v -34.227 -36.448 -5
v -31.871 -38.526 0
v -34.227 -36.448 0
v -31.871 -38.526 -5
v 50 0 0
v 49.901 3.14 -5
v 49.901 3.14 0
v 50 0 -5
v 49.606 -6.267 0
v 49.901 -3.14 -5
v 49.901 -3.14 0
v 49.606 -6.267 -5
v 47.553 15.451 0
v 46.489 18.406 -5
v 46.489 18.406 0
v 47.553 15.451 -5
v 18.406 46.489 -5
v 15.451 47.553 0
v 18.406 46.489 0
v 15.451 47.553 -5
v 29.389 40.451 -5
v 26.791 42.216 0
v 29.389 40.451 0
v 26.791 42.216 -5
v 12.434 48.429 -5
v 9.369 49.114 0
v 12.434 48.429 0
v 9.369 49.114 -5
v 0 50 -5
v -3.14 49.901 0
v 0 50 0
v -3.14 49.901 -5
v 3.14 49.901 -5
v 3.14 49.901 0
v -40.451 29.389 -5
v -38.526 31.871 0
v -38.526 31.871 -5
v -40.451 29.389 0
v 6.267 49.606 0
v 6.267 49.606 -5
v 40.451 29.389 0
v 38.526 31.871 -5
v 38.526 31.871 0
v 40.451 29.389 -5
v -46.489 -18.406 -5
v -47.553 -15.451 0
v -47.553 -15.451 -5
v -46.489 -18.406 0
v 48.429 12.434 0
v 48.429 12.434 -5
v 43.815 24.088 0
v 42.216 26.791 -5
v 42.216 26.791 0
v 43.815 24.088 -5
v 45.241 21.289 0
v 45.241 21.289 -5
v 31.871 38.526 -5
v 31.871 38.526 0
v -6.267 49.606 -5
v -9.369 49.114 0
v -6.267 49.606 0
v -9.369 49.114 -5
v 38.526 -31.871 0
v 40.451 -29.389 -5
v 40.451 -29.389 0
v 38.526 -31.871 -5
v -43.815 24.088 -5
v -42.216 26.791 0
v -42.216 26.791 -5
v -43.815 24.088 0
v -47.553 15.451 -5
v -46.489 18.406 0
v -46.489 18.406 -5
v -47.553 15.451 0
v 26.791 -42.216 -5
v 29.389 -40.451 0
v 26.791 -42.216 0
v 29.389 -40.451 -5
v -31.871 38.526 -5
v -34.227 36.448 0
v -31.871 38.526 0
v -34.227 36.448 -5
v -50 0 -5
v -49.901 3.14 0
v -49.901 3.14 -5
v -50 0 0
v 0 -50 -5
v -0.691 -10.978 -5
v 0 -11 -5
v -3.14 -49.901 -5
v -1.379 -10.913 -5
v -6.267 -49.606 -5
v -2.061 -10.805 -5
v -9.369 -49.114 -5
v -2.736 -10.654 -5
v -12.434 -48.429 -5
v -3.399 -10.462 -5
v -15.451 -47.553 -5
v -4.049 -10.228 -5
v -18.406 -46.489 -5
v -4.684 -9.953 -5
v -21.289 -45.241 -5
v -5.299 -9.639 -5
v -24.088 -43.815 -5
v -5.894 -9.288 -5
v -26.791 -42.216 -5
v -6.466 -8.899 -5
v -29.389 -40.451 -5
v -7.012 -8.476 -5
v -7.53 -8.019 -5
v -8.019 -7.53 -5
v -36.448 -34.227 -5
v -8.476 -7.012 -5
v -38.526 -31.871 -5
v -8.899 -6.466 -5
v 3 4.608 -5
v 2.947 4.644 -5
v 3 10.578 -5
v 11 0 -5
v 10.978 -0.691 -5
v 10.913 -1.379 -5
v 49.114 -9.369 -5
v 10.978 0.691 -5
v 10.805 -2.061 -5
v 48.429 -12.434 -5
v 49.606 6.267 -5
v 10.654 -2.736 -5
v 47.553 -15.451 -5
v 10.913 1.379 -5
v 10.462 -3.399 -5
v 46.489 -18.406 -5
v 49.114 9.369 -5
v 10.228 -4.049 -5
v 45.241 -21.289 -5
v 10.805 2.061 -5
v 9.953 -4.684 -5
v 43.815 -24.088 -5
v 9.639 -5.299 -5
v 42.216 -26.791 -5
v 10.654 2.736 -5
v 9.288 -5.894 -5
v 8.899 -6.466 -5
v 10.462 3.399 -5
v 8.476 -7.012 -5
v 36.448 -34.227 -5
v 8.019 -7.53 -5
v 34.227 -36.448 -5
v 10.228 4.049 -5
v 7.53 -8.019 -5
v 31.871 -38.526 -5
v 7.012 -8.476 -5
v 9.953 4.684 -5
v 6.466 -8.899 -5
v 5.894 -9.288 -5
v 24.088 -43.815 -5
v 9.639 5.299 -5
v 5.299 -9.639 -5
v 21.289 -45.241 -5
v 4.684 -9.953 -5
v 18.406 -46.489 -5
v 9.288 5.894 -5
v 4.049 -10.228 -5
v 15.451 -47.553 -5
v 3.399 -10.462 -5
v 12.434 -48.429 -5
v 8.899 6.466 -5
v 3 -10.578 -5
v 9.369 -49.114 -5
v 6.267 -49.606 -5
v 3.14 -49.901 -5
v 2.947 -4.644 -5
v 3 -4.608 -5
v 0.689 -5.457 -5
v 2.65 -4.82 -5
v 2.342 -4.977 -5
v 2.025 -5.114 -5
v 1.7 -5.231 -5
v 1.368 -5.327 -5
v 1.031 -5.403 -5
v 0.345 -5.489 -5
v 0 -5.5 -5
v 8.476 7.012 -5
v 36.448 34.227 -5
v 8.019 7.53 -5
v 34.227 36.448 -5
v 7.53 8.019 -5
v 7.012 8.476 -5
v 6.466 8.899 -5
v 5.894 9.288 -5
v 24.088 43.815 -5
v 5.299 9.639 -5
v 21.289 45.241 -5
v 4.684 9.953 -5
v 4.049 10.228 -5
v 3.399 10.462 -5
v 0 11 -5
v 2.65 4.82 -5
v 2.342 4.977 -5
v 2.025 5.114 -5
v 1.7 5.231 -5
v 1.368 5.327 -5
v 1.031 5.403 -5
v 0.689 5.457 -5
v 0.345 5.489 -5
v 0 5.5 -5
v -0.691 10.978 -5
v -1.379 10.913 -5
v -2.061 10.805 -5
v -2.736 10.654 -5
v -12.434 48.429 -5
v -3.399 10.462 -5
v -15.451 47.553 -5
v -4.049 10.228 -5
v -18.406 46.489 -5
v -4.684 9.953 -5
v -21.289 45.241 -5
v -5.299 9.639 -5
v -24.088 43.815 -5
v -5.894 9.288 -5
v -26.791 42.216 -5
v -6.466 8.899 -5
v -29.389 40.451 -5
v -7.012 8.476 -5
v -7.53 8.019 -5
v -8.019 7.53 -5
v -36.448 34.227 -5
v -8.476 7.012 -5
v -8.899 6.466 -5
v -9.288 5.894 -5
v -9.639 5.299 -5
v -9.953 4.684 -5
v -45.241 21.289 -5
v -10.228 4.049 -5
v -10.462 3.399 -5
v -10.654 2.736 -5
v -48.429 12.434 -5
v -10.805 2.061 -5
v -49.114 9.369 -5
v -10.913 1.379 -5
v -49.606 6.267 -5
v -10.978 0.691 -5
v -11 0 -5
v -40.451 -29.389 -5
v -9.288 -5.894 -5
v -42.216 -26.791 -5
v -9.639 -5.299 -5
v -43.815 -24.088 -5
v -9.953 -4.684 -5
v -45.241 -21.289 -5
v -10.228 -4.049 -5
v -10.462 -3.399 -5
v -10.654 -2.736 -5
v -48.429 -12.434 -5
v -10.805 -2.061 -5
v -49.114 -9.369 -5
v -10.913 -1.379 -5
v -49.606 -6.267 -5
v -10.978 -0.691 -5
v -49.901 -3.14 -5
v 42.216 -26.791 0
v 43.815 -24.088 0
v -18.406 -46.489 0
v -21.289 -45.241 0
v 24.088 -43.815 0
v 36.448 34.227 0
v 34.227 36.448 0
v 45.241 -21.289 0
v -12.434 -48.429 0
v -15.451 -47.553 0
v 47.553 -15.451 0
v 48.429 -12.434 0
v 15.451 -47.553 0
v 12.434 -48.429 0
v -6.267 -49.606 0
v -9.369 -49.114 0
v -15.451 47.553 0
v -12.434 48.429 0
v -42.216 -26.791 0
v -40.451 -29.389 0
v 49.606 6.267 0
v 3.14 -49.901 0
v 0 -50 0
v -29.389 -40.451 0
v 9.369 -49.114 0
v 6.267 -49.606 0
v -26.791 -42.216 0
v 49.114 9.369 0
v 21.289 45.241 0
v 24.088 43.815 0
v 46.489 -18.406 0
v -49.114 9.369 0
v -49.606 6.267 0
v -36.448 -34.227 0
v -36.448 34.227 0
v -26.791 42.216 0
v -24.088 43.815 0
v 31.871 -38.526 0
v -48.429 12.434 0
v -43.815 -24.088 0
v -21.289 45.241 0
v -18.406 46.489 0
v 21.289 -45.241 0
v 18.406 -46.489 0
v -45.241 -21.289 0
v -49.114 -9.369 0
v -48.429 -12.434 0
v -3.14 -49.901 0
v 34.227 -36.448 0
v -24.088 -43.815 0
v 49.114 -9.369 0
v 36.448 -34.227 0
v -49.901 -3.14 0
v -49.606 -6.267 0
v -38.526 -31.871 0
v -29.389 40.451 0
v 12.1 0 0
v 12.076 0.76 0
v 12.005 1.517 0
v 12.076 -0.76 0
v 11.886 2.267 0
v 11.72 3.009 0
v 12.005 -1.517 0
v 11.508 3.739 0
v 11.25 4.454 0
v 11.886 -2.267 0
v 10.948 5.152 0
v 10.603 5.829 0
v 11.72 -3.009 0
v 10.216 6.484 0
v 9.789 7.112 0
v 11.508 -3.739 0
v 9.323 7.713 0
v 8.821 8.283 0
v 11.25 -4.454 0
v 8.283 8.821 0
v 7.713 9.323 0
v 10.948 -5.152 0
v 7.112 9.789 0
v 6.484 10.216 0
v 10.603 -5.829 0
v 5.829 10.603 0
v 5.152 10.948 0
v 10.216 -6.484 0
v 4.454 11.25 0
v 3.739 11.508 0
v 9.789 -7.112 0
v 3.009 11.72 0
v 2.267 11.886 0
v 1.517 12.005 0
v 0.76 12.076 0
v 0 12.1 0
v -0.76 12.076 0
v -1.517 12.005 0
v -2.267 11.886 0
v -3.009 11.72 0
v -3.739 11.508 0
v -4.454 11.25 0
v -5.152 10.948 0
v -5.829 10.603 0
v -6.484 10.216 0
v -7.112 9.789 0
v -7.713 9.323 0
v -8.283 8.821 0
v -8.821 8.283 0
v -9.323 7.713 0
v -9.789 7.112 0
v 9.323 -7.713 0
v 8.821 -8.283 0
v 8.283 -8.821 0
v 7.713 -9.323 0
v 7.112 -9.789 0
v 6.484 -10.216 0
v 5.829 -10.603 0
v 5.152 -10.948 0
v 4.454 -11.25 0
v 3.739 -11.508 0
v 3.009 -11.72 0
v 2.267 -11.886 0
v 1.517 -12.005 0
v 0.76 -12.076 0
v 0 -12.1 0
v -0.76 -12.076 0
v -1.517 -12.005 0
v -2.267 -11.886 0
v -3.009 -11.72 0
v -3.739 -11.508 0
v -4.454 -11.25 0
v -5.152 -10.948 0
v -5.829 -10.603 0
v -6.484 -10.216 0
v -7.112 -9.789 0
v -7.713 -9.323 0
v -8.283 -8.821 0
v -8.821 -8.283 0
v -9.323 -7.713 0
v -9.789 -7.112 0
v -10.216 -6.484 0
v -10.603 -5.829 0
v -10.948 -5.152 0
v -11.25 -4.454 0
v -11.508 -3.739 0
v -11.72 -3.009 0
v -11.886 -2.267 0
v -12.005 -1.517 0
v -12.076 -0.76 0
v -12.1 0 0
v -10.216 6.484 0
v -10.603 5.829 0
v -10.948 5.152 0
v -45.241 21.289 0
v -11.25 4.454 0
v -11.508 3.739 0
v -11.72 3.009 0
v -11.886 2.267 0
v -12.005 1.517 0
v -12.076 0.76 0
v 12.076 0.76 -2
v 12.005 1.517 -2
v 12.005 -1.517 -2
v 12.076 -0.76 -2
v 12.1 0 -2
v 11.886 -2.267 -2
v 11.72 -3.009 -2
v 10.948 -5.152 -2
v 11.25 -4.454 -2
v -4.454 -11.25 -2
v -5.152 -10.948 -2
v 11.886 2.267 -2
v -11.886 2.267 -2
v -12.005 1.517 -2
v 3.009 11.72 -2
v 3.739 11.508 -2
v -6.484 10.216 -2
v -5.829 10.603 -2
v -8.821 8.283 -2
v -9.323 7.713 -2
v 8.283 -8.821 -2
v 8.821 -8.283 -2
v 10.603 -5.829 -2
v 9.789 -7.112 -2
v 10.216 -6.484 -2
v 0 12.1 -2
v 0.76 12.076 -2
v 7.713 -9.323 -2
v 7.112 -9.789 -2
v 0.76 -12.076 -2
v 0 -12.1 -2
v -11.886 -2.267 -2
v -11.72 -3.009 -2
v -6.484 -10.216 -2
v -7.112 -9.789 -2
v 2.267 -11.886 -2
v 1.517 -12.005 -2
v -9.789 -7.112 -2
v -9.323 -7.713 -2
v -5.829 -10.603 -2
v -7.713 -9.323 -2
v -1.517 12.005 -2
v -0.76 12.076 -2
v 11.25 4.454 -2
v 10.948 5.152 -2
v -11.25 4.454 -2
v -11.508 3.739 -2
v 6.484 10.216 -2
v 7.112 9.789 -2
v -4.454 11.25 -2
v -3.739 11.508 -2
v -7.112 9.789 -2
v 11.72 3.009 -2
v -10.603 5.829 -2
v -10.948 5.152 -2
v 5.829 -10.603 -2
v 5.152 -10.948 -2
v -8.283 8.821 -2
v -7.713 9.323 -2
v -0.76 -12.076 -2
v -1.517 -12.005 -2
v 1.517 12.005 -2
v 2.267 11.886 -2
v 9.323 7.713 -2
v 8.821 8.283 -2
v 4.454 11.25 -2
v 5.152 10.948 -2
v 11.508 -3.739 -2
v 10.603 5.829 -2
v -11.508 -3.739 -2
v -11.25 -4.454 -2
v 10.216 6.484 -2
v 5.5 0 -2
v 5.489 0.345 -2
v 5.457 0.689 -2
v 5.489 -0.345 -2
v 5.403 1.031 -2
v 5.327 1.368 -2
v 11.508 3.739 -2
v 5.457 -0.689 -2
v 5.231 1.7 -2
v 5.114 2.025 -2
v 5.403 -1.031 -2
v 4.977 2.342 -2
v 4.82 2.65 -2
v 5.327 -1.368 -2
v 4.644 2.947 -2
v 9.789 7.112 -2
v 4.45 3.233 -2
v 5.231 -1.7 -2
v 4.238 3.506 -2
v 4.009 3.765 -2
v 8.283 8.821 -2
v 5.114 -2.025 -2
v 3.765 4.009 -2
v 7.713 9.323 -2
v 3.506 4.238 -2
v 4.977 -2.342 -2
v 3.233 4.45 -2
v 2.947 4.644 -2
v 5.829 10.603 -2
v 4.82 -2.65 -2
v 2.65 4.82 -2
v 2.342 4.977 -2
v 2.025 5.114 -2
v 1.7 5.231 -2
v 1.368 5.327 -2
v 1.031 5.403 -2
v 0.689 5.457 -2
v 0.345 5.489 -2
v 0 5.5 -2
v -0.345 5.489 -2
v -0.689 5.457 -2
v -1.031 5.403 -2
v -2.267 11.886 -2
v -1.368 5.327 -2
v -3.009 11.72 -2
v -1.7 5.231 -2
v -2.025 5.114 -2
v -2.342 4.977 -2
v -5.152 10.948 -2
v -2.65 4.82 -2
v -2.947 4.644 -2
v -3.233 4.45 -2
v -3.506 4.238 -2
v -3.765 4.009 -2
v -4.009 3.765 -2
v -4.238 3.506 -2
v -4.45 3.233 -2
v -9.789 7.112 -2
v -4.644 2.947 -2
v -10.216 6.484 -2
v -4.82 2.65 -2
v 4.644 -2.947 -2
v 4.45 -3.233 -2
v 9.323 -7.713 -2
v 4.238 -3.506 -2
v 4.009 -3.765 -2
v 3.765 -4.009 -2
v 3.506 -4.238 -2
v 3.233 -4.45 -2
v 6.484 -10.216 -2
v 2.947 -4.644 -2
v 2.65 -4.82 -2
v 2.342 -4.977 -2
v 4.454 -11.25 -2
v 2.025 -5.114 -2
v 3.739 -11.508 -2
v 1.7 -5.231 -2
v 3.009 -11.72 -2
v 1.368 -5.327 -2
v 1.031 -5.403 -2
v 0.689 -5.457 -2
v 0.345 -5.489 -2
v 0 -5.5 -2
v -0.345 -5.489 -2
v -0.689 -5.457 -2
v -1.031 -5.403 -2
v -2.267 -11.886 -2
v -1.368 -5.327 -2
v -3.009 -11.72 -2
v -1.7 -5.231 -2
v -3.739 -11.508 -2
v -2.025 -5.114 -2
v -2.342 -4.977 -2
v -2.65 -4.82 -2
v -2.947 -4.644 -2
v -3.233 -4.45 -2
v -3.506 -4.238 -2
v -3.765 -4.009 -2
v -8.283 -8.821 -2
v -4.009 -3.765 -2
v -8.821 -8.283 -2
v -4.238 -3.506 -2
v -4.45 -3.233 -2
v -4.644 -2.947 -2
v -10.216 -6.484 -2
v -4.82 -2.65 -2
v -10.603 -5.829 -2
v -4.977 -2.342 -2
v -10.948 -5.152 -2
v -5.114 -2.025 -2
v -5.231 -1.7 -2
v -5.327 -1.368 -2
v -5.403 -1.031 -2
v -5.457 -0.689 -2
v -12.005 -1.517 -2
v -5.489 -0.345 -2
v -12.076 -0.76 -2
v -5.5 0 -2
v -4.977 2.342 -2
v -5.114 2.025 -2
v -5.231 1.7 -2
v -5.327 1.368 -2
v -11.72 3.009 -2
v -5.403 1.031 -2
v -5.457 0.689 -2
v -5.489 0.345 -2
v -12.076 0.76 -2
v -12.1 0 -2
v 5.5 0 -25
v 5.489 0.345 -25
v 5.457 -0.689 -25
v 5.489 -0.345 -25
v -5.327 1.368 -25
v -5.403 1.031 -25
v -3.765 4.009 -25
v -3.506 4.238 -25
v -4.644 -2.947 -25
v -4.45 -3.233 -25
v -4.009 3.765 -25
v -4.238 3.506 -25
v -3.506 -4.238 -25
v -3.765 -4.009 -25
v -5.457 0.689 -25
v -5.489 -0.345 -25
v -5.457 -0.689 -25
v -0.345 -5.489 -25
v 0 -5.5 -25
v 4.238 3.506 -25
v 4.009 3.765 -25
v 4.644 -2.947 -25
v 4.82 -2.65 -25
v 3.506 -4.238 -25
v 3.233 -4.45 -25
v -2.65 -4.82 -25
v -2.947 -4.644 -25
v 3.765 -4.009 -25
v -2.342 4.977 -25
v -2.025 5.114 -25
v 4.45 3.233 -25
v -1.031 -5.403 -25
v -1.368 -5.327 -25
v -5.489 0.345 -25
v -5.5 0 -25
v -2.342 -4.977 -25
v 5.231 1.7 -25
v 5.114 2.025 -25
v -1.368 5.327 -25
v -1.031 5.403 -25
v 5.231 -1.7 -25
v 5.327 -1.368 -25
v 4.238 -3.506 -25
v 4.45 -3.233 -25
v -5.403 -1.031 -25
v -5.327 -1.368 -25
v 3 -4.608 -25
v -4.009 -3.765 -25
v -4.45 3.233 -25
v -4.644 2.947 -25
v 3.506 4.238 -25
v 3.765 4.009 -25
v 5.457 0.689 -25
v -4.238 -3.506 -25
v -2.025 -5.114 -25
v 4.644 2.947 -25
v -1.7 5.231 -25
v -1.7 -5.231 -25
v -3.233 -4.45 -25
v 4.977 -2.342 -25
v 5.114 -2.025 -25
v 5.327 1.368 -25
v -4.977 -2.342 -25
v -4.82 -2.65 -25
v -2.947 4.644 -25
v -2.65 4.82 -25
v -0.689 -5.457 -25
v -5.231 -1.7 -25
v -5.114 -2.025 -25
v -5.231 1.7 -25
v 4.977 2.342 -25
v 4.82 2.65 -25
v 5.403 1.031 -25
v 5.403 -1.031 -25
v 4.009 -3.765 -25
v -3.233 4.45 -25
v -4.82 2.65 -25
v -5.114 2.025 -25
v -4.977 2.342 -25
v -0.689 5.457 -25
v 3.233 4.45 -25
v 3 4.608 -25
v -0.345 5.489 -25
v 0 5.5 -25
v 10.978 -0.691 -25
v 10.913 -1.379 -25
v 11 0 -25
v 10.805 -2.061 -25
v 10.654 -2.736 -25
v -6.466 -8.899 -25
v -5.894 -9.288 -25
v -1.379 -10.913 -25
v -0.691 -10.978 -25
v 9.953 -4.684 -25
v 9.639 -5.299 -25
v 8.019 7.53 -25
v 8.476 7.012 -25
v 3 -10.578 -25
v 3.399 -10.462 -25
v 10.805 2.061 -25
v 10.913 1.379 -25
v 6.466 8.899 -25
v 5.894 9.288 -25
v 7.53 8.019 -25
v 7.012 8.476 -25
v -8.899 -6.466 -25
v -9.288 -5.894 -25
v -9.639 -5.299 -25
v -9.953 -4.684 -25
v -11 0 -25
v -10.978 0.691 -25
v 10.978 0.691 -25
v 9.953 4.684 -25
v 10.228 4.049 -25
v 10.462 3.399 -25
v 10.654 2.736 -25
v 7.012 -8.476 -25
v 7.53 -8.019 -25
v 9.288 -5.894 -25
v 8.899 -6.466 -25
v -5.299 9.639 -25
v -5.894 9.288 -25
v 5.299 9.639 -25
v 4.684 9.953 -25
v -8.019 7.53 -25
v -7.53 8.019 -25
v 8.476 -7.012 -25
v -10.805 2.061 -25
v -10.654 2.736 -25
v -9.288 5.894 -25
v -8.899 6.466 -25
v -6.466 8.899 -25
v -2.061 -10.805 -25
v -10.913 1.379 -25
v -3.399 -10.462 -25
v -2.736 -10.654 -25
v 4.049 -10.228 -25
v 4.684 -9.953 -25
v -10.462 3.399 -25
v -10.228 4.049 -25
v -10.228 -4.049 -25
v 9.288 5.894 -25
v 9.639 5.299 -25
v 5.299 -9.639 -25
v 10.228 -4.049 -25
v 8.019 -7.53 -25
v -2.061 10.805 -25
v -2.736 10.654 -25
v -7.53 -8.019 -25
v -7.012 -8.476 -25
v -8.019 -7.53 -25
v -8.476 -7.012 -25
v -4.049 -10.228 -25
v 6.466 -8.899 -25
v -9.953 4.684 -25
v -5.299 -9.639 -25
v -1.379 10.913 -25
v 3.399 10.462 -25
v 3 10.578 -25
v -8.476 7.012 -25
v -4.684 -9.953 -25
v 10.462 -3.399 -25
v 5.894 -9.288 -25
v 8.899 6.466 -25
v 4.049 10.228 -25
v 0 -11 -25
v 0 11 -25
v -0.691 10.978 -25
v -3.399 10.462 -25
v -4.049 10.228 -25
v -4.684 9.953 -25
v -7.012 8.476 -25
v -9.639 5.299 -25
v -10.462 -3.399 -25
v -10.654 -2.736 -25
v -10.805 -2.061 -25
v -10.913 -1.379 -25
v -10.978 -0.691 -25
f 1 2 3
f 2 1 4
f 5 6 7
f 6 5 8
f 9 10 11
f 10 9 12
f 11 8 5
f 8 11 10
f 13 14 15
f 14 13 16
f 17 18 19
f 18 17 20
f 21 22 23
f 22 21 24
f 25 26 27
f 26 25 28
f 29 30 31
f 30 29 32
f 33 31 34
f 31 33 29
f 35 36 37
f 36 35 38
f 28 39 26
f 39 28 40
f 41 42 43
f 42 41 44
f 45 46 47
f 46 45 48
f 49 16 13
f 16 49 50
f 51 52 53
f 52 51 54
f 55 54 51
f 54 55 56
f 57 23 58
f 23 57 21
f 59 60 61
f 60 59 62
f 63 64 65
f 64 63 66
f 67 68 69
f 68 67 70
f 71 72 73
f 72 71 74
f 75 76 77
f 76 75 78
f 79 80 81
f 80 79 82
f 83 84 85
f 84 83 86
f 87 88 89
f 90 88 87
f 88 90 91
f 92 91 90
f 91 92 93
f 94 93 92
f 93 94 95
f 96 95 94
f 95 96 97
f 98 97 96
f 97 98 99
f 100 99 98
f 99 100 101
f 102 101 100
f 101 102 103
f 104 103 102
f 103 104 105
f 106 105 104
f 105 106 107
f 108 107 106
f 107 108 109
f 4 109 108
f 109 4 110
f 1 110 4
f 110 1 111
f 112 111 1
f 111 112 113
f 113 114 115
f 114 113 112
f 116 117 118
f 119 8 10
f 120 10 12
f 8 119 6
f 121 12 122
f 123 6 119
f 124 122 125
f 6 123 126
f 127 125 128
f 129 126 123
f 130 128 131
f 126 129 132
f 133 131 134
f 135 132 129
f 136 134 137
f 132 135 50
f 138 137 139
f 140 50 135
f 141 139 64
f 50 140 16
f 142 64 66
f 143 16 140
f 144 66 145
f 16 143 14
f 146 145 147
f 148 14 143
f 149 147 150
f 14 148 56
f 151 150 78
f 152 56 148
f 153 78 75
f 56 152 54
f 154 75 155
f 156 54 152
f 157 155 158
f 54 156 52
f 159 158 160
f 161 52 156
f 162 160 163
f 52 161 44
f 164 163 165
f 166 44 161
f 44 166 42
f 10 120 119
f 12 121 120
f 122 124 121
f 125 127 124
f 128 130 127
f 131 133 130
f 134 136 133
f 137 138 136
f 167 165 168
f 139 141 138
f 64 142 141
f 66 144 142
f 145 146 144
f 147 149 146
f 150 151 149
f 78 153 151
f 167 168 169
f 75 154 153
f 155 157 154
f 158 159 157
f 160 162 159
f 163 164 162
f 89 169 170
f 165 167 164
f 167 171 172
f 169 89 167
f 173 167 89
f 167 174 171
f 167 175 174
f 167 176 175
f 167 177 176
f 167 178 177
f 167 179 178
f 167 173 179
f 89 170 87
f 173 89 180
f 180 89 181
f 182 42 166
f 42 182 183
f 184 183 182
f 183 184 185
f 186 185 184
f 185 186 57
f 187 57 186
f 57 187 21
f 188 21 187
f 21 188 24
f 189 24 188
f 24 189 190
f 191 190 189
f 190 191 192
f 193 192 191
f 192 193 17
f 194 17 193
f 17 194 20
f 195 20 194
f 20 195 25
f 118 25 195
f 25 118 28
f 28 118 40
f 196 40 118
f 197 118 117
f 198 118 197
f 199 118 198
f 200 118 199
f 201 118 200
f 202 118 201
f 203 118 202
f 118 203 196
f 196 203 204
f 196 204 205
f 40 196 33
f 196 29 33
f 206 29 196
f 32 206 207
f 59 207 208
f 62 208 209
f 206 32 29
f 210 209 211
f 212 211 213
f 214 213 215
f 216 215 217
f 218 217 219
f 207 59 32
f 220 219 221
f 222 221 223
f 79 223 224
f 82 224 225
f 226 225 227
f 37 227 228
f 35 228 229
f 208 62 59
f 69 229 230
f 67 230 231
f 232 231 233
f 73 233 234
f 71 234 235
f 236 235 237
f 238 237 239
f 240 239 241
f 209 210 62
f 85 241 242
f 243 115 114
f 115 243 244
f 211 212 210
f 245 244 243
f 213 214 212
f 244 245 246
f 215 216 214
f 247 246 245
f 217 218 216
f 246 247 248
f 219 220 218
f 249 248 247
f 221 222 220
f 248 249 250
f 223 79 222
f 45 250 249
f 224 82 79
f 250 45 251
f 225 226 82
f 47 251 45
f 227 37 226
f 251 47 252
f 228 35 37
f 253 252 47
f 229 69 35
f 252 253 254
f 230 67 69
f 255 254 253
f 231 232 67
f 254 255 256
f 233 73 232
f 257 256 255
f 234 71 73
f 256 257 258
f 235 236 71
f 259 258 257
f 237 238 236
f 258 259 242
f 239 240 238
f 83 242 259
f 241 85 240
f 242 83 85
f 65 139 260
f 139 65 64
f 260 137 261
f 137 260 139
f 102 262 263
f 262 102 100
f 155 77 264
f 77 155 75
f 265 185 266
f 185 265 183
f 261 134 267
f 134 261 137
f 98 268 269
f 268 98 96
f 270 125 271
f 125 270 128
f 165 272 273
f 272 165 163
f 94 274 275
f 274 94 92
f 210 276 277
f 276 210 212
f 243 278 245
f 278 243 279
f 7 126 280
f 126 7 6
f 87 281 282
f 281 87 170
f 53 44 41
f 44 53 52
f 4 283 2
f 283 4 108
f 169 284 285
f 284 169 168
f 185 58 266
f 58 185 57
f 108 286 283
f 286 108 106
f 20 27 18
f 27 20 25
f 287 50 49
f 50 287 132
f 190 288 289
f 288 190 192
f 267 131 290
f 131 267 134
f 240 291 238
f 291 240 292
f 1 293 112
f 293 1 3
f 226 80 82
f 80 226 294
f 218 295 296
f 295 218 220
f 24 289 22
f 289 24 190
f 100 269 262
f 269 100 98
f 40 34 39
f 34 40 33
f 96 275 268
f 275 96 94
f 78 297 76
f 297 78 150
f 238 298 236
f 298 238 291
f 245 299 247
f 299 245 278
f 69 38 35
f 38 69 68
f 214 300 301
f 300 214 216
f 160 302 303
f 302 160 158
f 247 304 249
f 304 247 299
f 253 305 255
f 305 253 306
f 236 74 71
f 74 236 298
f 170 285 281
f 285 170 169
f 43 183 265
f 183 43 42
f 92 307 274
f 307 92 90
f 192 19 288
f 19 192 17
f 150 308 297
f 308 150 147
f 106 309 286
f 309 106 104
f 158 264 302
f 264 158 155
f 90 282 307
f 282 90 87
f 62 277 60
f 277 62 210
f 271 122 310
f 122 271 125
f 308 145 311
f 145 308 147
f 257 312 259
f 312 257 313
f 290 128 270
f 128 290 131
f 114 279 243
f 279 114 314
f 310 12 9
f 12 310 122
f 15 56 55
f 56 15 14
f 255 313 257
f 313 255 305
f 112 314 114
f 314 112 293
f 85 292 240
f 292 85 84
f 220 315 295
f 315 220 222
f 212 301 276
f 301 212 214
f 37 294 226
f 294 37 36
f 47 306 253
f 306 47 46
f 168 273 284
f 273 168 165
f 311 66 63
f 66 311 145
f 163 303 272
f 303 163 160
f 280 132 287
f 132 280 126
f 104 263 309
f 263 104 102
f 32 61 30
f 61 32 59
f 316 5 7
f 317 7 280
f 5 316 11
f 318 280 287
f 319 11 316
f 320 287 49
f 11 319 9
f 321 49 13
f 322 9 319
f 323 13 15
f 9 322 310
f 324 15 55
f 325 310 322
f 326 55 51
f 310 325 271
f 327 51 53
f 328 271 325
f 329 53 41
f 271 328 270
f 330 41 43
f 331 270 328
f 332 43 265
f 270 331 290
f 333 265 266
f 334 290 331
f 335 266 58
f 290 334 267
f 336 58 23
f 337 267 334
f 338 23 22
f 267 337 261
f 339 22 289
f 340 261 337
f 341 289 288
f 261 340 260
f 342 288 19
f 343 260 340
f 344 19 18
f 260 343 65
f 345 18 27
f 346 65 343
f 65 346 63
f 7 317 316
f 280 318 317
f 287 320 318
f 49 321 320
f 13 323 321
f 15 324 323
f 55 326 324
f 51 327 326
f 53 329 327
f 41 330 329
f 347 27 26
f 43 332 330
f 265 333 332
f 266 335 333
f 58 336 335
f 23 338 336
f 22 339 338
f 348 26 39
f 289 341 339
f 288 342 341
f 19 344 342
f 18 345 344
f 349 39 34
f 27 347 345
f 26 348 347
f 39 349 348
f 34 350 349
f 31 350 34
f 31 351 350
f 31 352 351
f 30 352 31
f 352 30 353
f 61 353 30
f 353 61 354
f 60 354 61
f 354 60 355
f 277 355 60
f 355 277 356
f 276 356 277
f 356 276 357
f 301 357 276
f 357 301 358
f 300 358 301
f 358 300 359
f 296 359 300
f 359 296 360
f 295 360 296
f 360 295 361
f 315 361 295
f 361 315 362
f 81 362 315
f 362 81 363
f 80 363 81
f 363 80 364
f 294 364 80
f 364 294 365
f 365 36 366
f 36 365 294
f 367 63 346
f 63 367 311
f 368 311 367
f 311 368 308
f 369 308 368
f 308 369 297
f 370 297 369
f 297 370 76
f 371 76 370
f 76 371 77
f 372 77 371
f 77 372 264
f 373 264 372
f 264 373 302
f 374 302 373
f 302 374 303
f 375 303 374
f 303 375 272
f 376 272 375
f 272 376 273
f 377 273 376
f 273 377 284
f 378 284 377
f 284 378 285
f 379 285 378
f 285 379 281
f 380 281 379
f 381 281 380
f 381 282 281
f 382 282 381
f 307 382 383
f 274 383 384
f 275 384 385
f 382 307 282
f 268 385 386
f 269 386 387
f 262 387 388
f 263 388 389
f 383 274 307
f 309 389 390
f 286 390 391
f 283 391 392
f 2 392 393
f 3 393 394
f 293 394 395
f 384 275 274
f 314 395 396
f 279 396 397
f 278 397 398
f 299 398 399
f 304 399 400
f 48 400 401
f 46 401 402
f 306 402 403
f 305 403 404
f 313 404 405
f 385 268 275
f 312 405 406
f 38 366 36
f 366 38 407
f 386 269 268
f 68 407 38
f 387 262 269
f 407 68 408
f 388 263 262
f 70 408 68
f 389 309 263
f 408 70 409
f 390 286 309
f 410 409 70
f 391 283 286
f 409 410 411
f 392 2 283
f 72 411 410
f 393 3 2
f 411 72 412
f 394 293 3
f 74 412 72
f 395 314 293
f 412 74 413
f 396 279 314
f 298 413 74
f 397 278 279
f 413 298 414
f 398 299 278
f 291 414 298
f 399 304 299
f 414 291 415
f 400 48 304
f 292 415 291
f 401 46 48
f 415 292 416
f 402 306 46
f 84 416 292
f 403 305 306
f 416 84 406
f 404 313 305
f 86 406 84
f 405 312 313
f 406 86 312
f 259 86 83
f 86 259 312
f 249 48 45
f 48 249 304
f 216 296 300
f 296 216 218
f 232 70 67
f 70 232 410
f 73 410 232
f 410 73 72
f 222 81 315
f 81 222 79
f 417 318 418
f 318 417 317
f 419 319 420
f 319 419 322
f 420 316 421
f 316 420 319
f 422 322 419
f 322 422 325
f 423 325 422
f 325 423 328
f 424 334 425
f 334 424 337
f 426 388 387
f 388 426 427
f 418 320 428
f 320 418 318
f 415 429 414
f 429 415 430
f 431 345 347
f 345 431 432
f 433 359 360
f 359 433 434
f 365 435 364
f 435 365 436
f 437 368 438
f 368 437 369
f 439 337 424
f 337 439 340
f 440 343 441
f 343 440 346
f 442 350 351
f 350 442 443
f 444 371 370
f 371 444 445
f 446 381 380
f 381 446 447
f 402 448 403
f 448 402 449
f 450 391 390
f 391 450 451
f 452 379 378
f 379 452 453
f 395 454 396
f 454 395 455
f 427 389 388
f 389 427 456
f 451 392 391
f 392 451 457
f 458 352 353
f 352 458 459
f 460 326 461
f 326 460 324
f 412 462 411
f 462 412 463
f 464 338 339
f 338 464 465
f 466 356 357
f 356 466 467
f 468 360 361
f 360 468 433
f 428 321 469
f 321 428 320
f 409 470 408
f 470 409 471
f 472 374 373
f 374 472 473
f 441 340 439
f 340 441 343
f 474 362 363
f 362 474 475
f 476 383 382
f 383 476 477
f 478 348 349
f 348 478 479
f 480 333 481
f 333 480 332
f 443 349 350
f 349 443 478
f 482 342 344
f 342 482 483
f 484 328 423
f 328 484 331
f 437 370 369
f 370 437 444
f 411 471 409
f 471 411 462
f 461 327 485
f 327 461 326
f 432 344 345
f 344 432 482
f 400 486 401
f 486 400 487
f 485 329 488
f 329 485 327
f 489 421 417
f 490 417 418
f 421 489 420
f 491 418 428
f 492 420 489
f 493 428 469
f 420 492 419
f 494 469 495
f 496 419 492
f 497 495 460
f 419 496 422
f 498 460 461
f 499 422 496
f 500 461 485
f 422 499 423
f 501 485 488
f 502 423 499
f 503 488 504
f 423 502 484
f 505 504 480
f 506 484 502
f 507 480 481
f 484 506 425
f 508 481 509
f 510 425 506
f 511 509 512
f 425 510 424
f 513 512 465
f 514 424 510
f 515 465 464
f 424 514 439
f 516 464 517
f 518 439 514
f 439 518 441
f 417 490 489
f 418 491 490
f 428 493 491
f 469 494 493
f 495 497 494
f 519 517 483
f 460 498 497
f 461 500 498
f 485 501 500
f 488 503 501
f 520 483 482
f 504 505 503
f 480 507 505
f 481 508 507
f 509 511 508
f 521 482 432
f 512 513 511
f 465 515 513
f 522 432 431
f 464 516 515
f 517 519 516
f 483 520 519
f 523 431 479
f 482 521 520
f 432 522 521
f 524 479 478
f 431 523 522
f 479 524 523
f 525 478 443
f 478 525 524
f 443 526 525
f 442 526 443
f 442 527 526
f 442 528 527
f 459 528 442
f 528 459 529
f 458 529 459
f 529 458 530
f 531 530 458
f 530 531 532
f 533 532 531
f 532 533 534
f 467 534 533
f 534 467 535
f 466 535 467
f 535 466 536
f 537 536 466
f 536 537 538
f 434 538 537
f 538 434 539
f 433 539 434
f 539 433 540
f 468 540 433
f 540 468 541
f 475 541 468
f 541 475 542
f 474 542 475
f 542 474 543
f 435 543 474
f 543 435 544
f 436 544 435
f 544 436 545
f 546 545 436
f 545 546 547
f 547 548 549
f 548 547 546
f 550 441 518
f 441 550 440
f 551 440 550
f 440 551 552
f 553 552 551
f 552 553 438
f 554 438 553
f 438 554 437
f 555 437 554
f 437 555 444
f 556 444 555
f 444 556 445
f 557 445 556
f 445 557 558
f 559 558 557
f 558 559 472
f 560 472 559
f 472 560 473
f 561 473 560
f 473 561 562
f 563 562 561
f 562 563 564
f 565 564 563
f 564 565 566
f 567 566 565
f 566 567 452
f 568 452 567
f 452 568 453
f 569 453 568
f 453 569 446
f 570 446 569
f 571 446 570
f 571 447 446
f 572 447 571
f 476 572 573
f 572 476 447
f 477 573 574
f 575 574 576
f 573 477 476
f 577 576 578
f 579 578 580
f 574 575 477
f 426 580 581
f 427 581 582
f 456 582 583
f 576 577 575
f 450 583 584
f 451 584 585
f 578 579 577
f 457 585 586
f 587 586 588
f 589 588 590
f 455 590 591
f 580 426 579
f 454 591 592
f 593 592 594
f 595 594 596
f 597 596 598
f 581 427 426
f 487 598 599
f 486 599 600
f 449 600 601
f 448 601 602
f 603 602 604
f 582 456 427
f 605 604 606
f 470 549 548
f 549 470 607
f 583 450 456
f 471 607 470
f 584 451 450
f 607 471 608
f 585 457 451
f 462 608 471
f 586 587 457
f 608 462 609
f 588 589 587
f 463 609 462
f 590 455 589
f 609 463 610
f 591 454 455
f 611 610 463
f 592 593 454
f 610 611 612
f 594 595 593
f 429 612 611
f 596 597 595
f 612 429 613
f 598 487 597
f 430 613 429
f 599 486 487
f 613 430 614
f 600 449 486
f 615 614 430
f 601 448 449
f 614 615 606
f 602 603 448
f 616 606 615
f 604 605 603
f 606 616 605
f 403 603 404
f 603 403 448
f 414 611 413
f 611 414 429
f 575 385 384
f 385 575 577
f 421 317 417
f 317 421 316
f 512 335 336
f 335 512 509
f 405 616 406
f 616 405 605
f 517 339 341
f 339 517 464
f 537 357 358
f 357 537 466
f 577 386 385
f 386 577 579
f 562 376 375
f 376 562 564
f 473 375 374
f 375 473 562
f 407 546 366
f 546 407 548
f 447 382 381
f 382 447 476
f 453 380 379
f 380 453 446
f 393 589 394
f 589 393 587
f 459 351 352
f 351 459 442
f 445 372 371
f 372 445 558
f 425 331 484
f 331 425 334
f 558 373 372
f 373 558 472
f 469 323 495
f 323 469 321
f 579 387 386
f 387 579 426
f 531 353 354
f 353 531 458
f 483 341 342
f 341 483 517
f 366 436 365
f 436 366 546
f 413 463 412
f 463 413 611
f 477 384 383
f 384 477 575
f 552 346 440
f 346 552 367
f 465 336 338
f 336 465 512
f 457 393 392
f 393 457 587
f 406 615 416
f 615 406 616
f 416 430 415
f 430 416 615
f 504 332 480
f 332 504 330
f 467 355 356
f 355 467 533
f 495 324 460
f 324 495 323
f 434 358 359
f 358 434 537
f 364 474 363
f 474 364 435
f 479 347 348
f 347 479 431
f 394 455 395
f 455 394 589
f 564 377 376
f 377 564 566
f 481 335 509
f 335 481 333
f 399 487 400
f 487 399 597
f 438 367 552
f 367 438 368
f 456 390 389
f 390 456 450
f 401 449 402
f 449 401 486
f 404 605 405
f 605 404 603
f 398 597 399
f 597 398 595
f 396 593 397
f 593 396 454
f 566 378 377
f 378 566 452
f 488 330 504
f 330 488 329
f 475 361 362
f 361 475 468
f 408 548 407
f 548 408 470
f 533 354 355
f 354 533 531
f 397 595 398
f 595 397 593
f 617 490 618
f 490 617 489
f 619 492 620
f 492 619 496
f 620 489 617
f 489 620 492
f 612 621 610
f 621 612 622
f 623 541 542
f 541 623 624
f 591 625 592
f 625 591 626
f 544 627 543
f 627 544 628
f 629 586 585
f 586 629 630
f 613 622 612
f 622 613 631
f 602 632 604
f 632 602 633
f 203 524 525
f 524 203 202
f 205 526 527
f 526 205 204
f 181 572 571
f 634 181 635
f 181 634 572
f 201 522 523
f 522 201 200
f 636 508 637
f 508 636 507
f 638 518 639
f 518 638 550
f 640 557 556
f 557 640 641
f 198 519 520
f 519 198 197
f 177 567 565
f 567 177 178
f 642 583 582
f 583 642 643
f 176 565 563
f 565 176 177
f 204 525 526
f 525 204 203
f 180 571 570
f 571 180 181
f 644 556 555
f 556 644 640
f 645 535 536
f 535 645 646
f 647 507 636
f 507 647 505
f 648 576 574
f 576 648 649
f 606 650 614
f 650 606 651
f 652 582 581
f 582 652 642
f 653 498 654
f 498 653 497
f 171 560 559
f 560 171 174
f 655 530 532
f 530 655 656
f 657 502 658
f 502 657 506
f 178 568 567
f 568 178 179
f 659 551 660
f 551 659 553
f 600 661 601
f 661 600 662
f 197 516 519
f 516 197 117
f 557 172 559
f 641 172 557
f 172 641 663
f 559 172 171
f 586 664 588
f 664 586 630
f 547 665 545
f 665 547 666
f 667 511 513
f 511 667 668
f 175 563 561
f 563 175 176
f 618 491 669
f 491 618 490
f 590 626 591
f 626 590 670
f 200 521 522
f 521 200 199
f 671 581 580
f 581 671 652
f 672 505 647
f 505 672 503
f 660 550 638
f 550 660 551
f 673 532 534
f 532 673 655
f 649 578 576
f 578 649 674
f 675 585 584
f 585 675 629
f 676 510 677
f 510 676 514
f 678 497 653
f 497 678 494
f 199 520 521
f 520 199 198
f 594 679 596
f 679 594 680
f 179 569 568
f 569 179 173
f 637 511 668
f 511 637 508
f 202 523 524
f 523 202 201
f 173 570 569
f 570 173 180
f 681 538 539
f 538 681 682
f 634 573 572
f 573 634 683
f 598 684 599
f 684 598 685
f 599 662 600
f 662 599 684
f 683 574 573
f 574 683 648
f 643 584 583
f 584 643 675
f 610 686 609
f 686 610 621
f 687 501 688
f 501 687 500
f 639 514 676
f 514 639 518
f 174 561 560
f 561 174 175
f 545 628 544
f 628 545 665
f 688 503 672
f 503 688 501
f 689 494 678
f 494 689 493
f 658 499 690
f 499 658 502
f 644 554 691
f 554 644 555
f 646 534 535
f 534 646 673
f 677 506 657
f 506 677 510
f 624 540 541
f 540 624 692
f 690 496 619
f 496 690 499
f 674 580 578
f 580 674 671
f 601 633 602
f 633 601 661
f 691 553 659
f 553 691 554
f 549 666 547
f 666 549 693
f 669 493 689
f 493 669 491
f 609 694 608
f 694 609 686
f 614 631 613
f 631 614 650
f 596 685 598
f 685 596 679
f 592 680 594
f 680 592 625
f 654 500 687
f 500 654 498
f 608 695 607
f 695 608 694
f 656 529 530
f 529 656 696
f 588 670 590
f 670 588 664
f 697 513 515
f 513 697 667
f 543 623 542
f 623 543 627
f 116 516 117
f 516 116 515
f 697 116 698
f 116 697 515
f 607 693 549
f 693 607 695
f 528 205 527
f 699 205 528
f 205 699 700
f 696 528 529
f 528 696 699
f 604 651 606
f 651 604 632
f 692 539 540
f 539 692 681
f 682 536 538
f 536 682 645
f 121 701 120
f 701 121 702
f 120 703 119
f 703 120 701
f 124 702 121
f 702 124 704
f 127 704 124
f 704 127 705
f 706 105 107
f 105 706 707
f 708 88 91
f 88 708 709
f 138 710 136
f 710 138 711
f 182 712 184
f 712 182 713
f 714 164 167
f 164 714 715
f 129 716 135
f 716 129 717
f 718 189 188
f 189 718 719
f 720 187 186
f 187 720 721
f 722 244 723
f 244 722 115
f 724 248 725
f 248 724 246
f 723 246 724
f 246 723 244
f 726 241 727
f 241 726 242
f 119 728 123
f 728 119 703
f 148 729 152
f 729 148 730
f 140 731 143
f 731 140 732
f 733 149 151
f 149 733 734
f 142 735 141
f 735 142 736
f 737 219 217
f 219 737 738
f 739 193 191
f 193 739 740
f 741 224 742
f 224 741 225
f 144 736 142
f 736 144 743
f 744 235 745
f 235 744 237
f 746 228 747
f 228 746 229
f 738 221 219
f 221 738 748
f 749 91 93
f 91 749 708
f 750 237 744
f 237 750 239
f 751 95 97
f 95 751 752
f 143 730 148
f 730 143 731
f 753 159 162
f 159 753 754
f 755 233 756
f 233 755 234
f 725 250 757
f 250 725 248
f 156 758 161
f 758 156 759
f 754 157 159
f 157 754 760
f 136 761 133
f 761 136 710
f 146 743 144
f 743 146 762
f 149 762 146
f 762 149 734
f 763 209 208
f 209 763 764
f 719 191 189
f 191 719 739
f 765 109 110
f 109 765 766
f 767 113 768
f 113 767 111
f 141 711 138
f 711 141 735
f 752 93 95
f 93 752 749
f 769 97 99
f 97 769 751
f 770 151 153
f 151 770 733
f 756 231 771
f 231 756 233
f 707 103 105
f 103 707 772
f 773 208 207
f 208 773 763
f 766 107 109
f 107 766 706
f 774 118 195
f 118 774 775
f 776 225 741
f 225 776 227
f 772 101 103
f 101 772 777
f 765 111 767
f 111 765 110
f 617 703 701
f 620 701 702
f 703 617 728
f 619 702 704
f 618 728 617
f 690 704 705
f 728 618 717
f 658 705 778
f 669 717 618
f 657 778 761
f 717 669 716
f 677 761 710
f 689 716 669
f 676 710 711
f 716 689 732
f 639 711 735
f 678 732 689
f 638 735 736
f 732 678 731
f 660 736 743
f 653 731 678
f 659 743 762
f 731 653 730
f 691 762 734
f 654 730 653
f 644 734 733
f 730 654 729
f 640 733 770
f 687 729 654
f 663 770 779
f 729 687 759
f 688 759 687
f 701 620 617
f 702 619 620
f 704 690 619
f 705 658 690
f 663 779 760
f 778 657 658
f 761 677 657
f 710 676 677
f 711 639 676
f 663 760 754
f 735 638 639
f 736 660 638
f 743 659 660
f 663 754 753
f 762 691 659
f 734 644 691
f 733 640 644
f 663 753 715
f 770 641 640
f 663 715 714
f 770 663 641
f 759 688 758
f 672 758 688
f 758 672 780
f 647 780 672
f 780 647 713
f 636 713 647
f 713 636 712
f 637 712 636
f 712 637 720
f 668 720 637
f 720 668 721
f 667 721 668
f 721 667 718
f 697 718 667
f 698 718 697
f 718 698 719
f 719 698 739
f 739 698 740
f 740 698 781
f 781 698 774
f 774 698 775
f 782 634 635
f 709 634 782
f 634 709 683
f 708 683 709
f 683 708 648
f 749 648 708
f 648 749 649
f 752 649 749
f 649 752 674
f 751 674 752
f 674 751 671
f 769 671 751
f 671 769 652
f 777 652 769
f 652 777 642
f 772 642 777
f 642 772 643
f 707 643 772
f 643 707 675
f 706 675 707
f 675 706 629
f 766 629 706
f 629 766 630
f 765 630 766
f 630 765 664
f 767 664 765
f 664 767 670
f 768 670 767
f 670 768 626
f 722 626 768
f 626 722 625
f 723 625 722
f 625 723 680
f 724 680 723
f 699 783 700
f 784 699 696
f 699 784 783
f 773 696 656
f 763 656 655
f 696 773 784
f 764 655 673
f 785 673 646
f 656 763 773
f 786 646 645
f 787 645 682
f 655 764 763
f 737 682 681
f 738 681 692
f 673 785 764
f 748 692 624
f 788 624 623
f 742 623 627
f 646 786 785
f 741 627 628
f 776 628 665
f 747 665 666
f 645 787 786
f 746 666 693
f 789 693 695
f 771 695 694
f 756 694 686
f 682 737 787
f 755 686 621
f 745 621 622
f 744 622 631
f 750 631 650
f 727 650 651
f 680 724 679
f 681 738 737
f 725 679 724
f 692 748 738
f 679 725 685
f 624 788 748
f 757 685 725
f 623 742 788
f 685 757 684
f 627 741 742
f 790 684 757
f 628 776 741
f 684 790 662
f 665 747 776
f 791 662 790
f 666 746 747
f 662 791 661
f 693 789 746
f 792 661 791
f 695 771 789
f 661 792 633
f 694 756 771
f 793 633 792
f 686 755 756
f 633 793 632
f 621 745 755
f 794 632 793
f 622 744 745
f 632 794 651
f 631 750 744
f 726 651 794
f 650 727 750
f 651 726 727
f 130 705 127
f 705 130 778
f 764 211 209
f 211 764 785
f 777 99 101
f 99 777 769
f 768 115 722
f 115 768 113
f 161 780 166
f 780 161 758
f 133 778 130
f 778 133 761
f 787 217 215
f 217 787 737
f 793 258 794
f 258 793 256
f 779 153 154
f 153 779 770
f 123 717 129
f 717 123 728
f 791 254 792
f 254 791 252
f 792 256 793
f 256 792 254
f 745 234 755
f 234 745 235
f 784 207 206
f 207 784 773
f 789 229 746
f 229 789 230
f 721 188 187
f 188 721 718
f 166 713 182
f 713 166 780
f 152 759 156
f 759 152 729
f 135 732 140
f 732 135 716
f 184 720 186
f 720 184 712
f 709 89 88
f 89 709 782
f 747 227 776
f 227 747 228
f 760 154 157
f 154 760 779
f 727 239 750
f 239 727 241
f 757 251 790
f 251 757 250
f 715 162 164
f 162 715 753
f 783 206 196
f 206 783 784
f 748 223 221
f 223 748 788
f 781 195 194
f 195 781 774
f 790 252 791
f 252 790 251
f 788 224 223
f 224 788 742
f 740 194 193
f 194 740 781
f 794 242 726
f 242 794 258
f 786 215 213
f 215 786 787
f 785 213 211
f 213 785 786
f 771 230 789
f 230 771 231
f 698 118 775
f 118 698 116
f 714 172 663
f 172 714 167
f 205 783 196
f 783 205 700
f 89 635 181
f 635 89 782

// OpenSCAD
// file: UGroovePulley.scad
// -------- This module was created by Min T Lin	--------
// -------- on the 31/01/2014 and is available 		--------
// -------- for distribution without any 				--------
// -------- restrictions. 										--------


$fn=100;		// render resolution 100 works well for a nice and smooth surface

// Bearing dimensions
//radius=7.5;	// 2.7mm works well for a 5mm drive shaft
//outer_radius=20;
//thickness=5;
//groove_radius=1;
//circles=0;
//UGroovePulley(11,40,5,1,0);
//translate([0,0,5])
//UGroovePulley(11,20,5,1,0);

module UGroovePulley(radius, outer_radius, thickness, groove_radius, circles)
{difference()
    {
	difference()
	{
		// main body
		cylinder(r= outer_radius, h=thickness);
		
		// shaft cutout
		cylinder(r=radius, h=thickness);
	
		// groove
		translate([0, 0, thickness/2])
			rotate_extrude(convexity = 10)
				translate([outer_radius, 0,0])
					circle(r=groove_radius);
		
	}
    
    for(i=[0:circles-1])	
				rotate([0,0,i*360/circles])
				translate([(radius+(outer_radius-radius)/2),0,-1])
				cylinder(r=thickness/2,h=max(thickness)+3);
}
}

// run the module
//UGroovePulley();
// main file
include<UGroovePulley.scad>
$fn=100;

rotate([180,0,0])
translate([0,0,5])
//render_part(1);
render_part(2);

module render_part(part_to_render) {
	if (part_to_render == 1) poleas();
	if (part_to_render == 2) plataforma();
}

module poleas(){

//GroovePulley(radius, outer_radius, thickness, groove_radius, circles)
UGroovePulley(12.5,40,5,1,0);
translate([0,0,5])
UGroovePulley(12.5,20,5,1,0);
}

module plataforma(){
translate([0,0,-5])
difference(){
//Disco plataforma
cylinder(5,50,50);
//Encastre para ruleman axial
cylinder(2,12.1,12.1);    
//Eje
cylinder(21,5.5,5.5);   

}
difference(){
    cylinder(20,11,11);
    cylinder(21,5.5,5.5);
    // Ranura
translate([0,-20,0])    #cube([3,40,40]);
    
 }}
